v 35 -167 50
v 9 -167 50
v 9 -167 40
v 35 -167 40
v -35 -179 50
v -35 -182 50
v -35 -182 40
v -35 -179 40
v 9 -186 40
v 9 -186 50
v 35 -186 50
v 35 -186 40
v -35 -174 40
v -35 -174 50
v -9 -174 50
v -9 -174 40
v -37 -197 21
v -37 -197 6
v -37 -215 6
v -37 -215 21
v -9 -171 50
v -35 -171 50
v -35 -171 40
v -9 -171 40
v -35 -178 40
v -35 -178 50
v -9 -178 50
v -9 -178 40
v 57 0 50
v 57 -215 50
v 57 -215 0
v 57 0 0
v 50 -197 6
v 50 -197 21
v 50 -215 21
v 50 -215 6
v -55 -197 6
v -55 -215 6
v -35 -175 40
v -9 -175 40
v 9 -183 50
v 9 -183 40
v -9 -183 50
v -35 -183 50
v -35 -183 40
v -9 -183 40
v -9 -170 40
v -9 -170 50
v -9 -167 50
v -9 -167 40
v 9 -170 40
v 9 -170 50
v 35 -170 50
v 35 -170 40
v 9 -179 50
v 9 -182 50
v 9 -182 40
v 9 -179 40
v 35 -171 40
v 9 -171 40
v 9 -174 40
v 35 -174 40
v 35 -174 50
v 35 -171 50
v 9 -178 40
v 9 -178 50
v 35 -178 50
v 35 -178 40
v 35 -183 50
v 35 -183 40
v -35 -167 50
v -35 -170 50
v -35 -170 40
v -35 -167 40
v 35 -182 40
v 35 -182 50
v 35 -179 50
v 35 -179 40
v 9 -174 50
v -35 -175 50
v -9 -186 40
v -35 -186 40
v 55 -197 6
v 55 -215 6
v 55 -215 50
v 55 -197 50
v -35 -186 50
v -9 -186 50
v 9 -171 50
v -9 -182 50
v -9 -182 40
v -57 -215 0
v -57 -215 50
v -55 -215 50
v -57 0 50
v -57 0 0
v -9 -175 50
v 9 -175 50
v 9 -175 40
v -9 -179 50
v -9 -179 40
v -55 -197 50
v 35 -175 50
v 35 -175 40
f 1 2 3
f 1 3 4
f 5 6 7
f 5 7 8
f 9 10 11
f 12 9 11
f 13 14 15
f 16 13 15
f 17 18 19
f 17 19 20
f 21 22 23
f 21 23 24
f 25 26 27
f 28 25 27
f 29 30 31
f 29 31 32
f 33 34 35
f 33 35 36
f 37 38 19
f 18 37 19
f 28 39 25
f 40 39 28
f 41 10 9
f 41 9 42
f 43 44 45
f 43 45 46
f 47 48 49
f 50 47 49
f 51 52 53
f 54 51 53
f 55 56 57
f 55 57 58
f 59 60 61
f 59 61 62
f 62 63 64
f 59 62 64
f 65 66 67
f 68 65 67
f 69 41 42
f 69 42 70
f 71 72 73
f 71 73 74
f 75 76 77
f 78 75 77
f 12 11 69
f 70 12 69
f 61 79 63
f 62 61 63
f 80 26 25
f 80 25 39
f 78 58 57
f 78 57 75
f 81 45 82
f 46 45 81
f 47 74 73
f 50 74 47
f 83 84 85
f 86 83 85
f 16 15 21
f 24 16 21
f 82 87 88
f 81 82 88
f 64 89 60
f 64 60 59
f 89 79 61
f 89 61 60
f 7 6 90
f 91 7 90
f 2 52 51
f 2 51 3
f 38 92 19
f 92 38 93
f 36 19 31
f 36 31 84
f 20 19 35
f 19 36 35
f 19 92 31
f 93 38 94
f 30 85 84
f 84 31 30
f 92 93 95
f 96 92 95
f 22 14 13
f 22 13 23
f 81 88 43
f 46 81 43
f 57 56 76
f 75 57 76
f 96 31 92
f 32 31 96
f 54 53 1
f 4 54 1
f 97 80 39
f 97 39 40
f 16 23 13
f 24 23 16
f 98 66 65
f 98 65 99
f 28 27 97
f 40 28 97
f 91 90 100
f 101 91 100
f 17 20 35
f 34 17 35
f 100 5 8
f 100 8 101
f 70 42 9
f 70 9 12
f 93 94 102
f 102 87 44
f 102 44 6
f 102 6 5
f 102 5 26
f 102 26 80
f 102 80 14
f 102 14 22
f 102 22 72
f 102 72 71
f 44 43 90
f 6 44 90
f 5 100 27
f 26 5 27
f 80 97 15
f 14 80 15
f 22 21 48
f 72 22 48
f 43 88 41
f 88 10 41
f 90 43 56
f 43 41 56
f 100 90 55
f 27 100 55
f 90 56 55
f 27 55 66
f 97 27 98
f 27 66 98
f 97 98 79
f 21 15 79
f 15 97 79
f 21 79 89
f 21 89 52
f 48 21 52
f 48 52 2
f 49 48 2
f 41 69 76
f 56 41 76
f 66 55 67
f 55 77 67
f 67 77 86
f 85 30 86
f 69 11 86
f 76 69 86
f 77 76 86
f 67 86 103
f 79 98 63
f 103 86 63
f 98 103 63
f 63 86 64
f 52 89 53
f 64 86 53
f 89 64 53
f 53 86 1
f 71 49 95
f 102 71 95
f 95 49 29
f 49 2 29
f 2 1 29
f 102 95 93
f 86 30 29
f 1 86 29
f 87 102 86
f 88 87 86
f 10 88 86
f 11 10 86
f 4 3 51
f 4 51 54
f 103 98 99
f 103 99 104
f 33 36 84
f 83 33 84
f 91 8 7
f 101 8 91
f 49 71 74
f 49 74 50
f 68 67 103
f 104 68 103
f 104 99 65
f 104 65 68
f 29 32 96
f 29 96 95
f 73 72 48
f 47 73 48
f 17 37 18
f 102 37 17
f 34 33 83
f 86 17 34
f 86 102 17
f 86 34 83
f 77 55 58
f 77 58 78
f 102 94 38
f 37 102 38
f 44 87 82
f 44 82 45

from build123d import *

# Parameters (mm, degrees)
F0_W     = 215
F0_H     = 50
F1_DEPTH = 57
F3_DEPTH = 18
F4_W     = 26
F4_H     = 3
F5_DEPTH = 10


with BuildPart() as f1:
    # F0 (on Right) → F1 (new body, symmetric)
    with BuildSketch(Plane.YZ):
        with Locations((-107.5, 25)):
            Rectangle(F0_W, F0_H)
    extrude(amount=F1_DEPTH, both=True)

    # F2 (on face) → F3 (cut)
    with BuildSketch(Plane.XZ.offset(215)):
        Polygon((-55, 50), (-55, 6), (-37, 6), (-37, 21), (50, 21), (50, 6), (55, 6), (55, 50), align=None)
    extrude(amount=-F3_DEPTH, mode=Mode.SUBTRACT)

    # F4 (on face) → F5 (cut)
    with BuildSketch(Plane.XY.offset(50)):
        with Locations((22, -168.5)):
            Rectangle(F4_W, F4_H)
        with Locations((22, -172.5)):
            Rectangle(F4_W, F4_H)
        with Locations((22, -176.5)):
            Rectangle(F4_W, F4_H)
        with Locations((22, -180.5)):
            Rectangle(F4_W, F4_H)
        with Locations((22, -184.5)):
            Rectangle(F4_W, F4_H)
        with Locations((-22, -184.5)):
            Rectangle(F4_W, F4_H)
        with Locations((-22, -180.5)):
            Rectangle(F4_W, F4_H)
        with Locations((-22, -176.5)):
            Rectangle(F4_W, F4_H)
        with Locations((-22, -172.5)):
            Rectangle(F4_W, F4_H)
        with Locations((-22, -168.5)):
            Rectangle(F4_W, F4_H)
    extrude(amount=-F5_DEPTH, mode=Mode.SUBTRACT)


solid = f1.part
